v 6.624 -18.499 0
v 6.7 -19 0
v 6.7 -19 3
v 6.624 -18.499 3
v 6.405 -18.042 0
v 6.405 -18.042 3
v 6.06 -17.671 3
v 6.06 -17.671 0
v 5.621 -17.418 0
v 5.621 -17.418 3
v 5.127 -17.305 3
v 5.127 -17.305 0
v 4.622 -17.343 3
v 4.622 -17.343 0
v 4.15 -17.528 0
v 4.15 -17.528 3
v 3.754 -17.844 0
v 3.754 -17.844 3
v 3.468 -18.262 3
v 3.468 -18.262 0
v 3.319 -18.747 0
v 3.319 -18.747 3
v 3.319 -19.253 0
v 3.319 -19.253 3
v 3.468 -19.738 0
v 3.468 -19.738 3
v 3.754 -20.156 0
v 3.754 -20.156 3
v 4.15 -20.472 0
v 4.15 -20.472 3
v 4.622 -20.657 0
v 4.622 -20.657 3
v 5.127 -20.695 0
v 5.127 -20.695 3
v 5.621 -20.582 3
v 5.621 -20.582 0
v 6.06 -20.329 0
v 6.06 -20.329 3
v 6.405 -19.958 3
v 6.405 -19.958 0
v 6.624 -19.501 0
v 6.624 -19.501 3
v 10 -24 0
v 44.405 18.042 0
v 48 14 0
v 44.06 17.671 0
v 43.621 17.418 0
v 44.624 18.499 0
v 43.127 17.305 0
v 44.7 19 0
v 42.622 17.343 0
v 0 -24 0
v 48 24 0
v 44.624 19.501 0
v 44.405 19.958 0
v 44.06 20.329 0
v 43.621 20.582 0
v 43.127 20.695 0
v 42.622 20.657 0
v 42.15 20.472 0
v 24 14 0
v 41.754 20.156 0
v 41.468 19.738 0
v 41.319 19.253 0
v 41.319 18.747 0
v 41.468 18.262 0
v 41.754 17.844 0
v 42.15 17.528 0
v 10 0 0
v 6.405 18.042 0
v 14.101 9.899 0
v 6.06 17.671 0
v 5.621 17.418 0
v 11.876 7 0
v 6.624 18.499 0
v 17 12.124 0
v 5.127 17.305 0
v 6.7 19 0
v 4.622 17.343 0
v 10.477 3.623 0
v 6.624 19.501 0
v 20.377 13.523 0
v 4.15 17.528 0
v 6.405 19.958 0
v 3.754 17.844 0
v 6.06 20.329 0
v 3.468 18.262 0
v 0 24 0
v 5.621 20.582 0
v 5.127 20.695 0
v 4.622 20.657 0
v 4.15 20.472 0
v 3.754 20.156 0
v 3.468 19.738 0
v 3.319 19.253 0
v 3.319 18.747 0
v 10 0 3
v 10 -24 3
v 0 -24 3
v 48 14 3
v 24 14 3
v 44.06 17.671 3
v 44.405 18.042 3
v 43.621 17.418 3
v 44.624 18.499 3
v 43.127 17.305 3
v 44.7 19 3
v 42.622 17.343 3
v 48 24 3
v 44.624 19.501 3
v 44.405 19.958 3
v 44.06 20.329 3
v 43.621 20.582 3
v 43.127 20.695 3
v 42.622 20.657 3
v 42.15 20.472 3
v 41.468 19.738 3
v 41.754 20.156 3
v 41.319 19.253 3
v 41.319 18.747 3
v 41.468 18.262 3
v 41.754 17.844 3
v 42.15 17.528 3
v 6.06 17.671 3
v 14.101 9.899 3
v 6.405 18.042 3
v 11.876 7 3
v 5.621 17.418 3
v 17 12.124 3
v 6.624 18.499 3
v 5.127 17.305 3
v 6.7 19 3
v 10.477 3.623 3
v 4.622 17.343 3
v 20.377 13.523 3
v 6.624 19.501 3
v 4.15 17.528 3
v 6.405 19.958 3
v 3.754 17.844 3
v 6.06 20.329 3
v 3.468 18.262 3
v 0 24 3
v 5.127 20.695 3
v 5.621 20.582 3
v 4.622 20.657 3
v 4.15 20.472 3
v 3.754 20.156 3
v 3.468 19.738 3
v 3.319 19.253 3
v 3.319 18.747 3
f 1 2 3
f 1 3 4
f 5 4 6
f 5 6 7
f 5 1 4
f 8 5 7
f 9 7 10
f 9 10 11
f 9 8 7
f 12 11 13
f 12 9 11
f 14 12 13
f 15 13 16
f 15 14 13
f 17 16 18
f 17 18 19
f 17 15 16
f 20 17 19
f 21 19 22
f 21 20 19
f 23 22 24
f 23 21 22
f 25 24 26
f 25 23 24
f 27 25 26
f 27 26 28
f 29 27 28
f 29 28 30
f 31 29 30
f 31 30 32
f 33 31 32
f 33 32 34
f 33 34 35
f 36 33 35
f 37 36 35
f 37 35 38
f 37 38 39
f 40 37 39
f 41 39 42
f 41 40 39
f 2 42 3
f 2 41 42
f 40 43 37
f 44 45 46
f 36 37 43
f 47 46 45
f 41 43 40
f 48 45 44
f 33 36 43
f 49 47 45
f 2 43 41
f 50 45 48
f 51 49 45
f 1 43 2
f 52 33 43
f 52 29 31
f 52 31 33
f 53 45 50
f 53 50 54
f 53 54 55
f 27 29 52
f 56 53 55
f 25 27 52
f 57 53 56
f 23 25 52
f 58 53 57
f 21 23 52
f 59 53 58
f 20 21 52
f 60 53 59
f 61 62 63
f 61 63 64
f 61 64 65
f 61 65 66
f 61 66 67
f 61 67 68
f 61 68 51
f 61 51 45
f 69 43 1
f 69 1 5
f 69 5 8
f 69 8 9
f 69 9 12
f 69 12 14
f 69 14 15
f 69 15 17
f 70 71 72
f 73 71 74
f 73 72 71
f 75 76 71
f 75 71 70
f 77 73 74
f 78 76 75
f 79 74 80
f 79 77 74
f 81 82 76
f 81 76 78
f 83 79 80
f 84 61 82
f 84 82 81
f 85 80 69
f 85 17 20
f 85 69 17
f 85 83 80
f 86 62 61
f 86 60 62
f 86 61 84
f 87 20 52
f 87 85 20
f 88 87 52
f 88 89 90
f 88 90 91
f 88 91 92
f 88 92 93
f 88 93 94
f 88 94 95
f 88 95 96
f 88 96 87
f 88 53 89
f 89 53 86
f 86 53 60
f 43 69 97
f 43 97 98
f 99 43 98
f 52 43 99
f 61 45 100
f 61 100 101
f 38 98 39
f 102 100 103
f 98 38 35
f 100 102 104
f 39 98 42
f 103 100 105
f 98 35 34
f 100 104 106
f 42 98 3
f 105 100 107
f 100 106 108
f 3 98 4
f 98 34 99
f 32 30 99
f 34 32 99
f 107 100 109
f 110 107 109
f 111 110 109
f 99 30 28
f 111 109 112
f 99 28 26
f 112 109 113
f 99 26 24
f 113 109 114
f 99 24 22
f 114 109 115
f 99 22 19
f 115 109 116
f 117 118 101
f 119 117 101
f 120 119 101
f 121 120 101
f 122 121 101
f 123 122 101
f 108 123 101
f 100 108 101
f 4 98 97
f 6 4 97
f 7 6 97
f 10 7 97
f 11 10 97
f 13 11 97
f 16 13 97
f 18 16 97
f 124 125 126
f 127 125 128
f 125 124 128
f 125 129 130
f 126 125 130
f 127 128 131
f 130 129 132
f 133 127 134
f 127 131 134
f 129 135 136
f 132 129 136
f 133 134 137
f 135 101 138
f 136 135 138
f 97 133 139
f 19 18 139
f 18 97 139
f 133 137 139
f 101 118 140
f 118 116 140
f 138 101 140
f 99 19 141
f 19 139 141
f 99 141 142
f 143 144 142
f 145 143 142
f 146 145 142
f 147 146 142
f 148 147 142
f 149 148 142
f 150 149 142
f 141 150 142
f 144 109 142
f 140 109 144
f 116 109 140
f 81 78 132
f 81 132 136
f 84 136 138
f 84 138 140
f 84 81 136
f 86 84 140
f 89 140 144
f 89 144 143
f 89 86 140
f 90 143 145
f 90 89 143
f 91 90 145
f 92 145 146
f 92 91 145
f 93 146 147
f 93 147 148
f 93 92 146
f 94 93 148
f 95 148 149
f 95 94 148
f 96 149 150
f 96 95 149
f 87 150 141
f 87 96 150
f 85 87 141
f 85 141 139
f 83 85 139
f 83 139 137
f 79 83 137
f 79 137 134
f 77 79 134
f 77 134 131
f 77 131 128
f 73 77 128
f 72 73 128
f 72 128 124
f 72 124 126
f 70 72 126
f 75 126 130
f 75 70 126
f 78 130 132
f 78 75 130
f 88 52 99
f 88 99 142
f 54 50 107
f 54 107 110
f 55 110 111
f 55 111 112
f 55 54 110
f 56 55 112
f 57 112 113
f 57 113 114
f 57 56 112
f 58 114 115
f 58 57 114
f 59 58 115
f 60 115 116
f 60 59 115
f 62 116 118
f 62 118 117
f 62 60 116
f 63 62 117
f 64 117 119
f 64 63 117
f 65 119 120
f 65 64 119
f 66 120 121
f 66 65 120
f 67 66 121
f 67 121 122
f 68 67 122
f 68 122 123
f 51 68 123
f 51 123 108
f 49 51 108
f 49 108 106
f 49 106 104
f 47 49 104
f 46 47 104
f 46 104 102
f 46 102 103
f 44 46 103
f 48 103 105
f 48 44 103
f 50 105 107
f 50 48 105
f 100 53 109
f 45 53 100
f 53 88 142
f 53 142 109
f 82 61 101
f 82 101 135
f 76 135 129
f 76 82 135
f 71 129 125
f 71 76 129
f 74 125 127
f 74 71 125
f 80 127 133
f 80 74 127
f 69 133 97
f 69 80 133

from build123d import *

# Parameters (mm, degrees)
SKETCH_1_R      = 1.7
EXTRUDE_1_DEPTH = 3


with BuildPart() as part:
    # 草图1 → 凸台-拉伸1 (new body)
    with BuildSketch(Plane.XY):
        with BuildLine():
            Line((0, 0), (0, 24))
            Line((0, 24), (24, 24))
            Line((24, 24), (38, 24))
            Line((38, 24), (48, 24))
            Line((48, 24), (48, 14))
            Line((48, 14), (34, 14))
            Line((34, 14), (24, 14))
            ThreePointArc((24, 14), (14.100505063, 9.899494937), (10, 0))
            Line((10, 0), (10, -12))
            Line((10, -12), (10, -24))
            Line((10, -24), (0, -24))
            Line((0, -24), (0, -14))
            Line((0, -14), (0, 0))
        make_face()
        with Locations((43, 19)):
            Circle(SKETCH_1_R, mode=Mode.SUBTRACT)
        with Locations((5, -19)):
            Circle(SKETCH_1_R, mode=Mode.SUBTRACT)
        with Locations((5, 19)):
            Circle(SKETCH_1_R, mode=Mode.SUBTRACT)
    extrude(amount=EXTRUDE_1_DEPTH)


solid = part.part
